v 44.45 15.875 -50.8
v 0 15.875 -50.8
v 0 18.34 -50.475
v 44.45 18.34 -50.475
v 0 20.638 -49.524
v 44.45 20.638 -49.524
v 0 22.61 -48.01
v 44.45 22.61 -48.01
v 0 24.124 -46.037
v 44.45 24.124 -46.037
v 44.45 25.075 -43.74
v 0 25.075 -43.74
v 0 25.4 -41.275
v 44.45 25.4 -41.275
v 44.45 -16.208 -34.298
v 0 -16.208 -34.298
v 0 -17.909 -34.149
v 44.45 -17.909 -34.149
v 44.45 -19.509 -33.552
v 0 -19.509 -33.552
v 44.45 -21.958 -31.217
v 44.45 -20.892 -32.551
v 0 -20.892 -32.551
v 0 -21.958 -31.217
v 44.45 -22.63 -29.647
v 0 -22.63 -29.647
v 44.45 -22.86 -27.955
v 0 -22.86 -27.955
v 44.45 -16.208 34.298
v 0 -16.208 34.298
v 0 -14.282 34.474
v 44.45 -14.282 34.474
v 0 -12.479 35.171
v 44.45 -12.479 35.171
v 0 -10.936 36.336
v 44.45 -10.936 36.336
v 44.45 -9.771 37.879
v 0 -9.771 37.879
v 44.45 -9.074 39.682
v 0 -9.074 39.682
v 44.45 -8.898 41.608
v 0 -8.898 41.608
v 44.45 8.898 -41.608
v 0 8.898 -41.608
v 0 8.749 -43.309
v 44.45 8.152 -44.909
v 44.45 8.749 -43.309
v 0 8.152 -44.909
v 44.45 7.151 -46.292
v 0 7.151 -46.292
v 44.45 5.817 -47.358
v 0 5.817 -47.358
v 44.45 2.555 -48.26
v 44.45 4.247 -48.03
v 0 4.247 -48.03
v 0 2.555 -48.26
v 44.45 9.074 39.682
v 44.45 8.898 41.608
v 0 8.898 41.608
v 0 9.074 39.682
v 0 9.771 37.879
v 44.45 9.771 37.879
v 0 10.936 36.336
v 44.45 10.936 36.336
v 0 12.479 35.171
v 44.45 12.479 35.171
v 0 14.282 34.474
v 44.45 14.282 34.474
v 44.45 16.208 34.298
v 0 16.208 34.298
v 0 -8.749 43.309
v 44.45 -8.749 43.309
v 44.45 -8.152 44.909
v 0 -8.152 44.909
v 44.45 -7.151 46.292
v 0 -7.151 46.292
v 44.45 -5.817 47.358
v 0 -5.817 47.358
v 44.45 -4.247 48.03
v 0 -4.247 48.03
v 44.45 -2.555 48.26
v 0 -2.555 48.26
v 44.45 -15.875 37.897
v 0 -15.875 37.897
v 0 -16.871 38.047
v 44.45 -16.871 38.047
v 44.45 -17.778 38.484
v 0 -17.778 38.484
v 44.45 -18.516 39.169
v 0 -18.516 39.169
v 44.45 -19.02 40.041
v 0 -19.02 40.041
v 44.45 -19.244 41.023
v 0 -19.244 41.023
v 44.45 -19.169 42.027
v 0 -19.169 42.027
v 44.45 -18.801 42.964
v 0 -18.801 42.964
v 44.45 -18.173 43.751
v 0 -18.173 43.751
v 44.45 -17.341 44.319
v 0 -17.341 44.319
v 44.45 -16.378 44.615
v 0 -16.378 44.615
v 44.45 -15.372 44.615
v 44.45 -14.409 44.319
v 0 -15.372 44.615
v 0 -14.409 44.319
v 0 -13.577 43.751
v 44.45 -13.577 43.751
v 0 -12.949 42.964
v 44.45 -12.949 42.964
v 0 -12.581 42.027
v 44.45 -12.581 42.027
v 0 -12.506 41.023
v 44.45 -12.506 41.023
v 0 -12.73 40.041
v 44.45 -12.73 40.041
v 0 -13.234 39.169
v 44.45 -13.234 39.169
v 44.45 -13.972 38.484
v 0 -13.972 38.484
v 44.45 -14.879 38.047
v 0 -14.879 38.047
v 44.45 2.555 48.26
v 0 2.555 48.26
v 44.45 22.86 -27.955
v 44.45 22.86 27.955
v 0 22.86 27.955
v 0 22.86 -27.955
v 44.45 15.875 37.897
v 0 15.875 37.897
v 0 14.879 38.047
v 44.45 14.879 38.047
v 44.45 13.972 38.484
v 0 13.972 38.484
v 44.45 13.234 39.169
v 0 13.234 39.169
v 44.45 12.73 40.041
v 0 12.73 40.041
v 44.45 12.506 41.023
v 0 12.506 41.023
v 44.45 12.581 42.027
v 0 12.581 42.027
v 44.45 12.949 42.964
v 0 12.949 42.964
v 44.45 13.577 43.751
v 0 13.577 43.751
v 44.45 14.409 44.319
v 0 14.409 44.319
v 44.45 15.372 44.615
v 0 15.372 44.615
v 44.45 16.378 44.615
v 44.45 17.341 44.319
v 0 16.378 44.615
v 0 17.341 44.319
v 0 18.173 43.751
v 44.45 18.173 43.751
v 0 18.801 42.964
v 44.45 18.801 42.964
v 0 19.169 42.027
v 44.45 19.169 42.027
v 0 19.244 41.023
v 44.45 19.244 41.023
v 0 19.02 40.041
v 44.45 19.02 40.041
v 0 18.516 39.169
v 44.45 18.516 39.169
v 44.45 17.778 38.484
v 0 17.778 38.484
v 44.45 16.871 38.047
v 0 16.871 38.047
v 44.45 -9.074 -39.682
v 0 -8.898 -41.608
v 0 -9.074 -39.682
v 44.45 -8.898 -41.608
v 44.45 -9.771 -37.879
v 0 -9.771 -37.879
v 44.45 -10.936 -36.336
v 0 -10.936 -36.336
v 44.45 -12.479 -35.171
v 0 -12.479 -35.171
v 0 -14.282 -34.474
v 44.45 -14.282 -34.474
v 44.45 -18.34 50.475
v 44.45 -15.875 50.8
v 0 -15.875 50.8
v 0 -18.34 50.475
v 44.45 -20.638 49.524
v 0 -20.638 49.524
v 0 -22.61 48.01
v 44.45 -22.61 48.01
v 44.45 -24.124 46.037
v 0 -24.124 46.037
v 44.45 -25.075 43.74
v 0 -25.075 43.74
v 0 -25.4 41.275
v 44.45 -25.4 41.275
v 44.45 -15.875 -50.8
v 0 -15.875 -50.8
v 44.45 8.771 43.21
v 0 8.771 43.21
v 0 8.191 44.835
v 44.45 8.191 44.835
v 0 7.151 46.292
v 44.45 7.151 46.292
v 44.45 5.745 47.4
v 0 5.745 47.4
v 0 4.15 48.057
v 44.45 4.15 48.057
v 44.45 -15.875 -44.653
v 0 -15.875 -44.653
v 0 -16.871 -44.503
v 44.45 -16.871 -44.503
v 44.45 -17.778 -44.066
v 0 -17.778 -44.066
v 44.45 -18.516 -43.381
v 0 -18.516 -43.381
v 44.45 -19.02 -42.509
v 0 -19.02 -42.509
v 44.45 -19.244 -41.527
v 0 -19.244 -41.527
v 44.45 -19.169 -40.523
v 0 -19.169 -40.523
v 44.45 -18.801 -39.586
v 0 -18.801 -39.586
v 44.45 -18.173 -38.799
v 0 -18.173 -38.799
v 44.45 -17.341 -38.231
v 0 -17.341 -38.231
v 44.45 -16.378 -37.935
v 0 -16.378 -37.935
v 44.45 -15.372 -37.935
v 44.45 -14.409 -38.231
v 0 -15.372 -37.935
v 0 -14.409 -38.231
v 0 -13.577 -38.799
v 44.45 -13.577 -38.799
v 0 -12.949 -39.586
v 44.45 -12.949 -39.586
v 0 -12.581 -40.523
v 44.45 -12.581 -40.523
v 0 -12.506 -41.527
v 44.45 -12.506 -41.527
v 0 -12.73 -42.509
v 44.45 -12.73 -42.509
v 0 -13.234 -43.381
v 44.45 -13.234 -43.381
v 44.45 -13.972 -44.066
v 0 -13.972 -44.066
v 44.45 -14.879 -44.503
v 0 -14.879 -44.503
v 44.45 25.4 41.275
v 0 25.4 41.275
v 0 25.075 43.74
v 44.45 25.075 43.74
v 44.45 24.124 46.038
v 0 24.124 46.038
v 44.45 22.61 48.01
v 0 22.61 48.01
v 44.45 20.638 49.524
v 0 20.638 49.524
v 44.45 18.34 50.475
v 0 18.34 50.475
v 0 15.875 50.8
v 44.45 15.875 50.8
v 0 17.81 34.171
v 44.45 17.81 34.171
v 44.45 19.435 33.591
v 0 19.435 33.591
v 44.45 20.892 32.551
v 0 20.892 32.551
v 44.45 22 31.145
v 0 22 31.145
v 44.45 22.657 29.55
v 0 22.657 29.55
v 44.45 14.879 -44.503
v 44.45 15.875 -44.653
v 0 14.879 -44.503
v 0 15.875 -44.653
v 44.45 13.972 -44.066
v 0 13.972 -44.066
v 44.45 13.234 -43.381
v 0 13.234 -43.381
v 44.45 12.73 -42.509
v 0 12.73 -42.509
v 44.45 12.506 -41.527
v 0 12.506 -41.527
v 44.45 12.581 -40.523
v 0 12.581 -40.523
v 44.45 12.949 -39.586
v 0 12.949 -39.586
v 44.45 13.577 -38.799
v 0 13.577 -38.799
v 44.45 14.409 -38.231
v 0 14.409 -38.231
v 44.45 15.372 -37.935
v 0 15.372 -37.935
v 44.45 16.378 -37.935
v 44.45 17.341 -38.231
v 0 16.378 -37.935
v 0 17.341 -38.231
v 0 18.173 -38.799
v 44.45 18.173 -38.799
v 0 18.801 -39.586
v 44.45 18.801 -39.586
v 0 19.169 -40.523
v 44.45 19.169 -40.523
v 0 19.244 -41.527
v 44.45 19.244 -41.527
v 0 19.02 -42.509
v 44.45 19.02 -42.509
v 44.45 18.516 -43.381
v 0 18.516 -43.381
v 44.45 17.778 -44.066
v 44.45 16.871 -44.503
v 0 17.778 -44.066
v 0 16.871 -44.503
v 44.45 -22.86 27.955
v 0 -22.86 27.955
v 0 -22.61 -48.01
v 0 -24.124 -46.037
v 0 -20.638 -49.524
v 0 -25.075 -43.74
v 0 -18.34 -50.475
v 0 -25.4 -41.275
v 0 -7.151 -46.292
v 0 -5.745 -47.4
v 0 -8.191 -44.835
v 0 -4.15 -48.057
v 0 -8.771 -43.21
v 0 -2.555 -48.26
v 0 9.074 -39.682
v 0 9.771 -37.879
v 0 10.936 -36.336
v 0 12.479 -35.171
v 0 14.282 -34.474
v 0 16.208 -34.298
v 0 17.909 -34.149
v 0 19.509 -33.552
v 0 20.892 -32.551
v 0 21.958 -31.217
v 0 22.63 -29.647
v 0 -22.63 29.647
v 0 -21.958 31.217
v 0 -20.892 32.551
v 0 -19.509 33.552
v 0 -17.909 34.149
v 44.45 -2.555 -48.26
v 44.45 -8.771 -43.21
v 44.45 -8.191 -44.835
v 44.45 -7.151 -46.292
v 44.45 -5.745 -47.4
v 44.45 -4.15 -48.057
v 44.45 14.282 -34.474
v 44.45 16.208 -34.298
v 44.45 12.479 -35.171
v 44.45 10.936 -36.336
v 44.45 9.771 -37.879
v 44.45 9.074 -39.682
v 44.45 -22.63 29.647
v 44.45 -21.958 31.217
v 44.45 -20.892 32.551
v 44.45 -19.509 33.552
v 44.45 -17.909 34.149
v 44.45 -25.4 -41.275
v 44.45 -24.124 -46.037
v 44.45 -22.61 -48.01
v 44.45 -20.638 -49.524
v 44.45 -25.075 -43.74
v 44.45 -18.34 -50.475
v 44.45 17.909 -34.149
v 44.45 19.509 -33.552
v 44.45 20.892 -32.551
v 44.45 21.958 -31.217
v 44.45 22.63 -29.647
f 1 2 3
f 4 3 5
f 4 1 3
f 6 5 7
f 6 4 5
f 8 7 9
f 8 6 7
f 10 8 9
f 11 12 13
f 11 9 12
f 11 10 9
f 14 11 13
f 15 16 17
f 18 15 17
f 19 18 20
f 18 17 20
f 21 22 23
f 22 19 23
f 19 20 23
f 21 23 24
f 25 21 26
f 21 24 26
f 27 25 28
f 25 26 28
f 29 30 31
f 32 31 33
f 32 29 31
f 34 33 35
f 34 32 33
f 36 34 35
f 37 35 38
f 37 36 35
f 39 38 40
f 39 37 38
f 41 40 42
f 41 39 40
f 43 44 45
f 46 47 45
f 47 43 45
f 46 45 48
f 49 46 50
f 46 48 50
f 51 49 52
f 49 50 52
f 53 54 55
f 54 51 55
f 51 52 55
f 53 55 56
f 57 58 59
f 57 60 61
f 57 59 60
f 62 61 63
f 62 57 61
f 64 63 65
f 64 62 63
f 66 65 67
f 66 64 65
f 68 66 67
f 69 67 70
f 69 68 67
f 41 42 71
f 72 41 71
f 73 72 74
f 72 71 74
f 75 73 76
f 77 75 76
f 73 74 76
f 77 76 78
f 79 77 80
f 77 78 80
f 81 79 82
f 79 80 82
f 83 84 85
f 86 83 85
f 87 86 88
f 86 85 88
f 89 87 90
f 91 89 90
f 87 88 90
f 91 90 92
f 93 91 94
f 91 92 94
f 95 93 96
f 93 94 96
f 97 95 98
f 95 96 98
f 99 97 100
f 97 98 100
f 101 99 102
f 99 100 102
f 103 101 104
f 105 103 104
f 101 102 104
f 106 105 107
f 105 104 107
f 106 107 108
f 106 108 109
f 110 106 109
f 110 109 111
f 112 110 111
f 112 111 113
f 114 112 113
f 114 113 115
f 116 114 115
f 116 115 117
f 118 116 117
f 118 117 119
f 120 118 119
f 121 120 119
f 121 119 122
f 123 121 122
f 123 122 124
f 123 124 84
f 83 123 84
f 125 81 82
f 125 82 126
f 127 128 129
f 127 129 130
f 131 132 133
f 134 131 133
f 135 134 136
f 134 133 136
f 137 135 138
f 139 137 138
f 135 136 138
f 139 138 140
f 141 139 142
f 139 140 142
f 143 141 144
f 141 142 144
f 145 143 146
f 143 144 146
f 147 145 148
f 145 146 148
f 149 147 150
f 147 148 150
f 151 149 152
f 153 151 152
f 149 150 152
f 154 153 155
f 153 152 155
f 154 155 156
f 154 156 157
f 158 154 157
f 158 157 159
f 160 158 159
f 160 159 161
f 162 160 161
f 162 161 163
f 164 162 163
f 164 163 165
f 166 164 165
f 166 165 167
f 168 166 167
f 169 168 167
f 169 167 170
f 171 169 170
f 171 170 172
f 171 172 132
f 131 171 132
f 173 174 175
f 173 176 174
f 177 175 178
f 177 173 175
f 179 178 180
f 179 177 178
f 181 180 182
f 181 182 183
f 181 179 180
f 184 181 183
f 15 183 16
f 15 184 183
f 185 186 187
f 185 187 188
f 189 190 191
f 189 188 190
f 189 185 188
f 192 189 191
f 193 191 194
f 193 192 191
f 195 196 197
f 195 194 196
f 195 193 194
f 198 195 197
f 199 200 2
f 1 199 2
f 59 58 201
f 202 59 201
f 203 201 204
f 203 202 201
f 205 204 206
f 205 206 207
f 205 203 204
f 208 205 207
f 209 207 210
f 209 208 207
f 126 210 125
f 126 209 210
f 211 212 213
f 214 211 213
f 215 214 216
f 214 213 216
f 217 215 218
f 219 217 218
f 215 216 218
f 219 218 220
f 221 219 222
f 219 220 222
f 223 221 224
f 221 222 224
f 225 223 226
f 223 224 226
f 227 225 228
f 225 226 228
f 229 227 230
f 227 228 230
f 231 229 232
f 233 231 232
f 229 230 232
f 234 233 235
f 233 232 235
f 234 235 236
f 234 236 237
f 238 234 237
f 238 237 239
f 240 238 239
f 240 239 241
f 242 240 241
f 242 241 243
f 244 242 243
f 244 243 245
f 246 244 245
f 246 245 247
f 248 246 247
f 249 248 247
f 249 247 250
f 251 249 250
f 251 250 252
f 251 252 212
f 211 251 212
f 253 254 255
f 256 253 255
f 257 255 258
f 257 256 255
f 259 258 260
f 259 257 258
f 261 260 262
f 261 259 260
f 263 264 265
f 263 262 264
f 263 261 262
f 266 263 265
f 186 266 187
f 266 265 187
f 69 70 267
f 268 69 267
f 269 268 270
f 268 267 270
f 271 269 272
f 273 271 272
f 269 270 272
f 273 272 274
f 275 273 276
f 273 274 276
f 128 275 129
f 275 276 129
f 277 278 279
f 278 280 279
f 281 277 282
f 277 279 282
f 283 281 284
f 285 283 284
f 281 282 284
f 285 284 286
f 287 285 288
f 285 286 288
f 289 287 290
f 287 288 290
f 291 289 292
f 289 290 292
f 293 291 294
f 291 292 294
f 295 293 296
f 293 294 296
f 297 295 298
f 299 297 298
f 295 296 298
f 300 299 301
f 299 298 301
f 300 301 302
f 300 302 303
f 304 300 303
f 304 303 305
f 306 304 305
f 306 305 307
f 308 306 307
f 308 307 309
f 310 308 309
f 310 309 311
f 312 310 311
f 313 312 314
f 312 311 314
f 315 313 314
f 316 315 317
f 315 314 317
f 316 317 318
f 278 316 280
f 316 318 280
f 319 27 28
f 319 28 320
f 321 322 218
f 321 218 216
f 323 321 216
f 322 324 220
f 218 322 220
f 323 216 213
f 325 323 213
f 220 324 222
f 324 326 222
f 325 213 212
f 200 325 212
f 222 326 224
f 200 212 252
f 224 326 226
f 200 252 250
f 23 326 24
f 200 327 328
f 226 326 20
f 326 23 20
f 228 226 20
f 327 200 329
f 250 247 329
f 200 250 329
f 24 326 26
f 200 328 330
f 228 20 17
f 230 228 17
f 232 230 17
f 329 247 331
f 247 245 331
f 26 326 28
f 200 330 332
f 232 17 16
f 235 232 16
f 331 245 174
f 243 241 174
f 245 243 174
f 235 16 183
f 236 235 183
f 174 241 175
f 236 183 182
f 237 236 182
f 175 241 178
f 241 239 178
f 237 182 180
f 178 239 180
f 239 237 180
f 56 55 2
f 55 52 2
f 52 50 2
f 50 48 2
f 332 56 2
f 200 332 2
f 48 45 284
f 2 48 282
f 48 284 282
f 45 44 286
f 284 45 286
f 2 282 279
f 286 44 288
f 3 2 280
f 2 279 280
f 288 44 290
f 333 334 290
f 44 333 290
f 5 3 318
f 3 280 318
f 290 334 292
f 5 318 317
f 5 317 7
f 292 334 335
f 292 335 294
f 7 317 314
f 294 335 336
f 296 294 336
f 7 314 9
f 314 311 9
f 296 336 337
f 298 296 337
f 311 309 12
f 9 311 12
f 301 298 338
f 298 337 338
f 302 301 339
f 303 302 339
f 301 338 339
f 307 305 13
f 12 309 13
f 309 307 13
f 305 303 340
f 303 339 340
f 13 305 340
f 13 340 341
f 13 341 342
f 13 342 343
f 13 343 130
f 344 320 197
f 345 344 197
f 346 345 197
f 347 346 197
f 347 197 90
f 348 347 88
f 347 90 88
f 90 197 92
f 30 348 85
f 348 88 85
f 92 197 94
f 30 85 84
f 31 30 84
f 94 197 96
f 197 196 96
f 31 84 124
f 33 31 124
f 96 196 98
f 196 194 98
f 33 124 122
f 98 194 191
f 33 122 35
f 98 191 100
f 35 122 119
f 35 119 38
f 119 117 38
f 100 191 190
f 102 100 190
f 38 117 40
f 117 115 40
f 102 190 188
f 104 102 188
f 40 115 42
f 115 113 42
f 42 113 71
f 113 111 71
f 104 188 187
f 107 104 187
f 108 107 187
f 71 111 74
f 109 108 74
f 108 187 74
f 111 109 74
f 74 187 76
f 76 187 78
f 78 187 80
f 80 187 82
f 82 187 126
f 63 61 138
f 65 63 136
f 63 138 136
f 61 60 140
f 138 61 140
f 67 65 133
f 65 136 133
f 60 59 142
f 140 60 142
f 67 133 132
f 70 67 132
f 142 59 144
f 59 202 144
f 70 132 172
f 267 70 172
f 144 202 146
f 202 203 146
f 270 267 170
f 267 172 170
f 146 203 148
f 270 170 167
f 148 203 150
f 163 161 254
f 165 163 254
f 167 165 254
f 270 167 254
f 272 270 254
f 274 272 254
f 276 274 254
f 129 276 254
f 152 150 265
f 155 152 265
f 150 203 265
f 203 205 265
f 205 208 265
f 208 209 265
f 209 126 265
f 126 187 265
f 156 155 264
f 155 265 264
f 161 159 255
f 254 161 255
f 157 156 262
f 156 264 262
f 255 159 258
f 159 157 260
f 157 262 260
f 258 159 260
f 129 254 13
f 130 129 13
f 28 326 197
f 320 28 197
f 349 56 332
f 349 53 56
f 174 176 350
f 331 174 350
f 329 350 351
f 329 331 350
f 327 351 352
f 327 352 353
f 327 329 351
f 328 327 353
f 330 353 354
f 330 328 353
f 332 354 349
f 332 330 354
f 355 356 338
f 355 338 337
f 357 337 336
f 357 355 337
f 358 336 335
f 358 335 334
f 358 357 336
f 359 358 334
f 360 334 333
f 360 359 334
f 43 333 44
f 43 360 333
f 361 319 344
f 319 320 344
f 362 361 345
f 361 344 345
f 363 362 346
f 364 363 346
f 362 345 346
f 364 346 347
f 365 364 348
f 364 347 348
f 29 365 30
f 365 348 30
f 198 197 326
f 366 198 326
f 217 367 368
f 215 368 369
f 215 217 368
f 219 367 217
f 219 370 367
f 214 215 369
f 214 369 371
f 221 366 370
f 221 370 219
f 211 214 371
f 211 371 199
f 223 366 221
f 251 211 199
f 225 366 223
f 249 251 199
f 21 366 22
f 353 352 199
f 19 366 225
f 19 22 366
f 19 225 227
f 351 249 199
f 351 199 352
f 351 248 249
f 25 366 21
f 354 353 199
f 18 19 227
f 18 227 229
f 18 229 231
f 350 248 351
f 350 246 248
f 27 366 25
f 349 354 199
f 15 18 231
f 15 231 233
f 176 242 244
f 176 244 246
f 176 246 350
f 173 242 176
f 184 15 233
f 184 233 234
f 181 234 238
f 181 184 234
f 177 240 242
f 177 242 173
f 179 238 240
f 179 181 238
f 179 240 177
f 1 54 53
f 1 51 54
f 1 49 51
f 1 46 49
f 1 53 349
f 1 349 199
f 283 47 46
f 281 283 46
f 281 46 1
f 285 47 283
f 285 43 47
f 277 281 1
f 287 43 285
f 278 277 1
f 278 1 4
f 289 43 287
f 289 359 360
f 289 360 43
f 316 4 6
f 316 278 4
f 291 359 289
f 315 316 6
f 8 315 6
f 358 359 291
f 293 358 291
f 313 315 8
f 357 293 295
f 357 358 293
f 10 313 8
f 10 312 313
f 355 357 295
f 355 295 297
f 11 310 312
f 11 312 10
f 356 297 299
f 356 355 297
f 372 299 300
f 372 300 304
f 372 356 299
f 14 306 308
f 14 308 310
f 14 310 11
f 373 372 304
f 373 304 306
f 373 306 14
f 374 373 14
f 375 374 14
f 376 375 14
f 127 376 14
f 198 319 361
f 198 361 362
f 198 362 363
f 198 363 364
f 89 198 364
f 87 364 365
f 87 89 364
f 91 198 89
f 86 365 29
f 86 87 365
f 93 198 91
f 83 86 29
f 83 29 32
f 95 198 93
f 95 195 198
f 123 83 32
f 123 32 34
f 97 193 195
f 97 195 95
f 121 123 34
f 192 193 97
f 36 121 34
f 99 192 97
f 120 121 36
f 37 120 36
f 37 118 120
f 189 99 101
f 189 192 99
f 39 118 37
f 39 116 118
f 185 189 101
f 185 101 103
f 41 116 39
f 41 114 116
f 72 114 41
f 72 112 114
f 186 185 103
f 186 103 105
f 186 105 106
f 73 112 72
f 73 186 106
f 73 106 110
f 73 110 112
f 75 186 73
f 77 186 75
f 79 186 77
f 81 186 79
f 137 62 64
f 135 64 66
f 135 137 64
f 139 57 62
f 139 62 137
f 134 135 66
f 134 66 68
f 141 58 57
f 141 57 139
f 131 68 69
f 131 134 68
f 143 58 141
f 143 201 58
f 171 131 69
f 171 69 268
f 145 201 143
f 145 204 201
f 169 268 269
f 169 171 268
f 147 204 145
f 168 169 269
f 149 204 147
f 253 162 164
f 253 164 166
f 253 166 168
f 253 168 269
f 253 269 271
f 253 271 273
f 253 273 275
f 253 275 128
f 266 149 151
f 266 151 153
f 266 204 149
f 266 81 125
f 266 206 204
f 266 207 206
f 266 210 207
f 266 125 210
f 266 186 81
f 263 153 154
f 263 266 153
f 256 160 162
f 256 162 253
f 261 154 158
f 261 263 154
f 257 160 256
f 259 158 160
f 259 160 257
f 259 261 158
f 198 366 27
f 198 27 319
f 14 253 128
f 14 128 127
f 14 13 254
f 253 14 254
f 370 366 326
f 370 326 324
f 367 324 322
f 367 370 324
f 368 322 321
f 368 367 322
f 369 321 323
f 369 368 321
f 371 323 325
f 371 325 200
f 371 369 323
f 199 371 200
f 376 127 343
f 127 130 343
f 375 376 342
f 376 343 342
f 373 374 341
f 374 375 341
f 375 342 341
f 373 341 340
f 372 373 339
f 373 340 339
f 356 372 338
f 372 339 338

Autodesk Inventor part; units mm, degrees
ref_plane "YZ Plane" through (0, 0, 0) normal (1, 0, 0) x (0, 1, 0)
ref_plane "XZ Plane" through (0, 0, 0) normal (0, 1, 0) x (-1, 0, 0)
ref_plane "XY Plane" through (0, 0, 0) normal (0, 0, 1) x (1, 0, 0)
sketch "Sketch1" plane through (0, 0, 0) normal (1, 0, 0) x (0, 1, 0)
  line L0 (-25.4, -50.8) -> (25.4, -50.8)
  line L1 (25.4, -50.8) -> (25.4, 50.8)
  line L2 (25.4, 50.8) -> (-25.4, 50.8)
  line L3 (-25.4, 50.8) -> (-25.4, -50.8)
  line L4 (-25.4, -50.8) -> (25.4, 50.8) construction
  line L5 (25.4, -50.8) -> (-25.4, 50.8) construction
  point P0 (0, 0)
  dimension "d0" = 50.8
  dimension "d1" = 101.6
extrude "Extrusion1" add sketch "Sketch1" along normal blind 44.45
fillet "Fillet2" radius 9.525 4 edges at (22.225, 25.4, 50.8) (22.225, -25.4, 50.8) (22.225, -25.4, -50.8) (22.225, 25.4, -50.8)
sketch "Sketch5" plane through (44.45, 0, 0) normal (1, 0, 0) x (0, 0, -1)
  arc A0 (50.8, 15.875) -> (41.275, 25.4) centre (41.275, 15.875) ccw projected
  line L0 (41.275, 25.4) -> (-41.275, 25.4) projected
  arc A1 (-41.275, 25.4) -> (-50.8, 15.875) centre (-41.275, 15.875) ccw projected
  line L1 (-50.8, 15.875) -> (-50.8, -15.875) projected
  arc A2 (-50.8, -15.875) -> (-41.275, -25.4) centre (-41.275, -15.875) ccw projected
  line L2 (-41.275, -25.4) -> (41.275, -25.4) projected
  arc A3 (41.275, -25.4) -> (50.8, -15.875) centre (41.275, -15.875) ccw projected
  line L3 (50.8, -15.875) -> (50.8, 15.875) projected
  point P0 (0, 0)
hole "Hole2" at (44.45, -15.875, -41.275) at (44.45, -15.875, 41.275) at (44.45, 15.875, 41.275) at (44.45, 15.875, -41.275) direction (-1, 0, 0) diameter 6.7564 end through all clearance for "Flat Head Machine Screw (82)" size "1/4" standard "Ansi Unified Screw Threads"
sketch "Sketch6" plane through (44.45, 0, 0) normal (1, 0, 0) x (0, 0, -1)
  circle A0 centre (41.275, -15.875) radius 3.3782 projected
  circle A1 centre (41.275, -15.875) radius 6.985
  circle A2 centre (41.275, 15.875) radius 3.3782 projected
  circle A3 centre (41.275, 15.875) radius 6.985
  circle A4 centre (-41.275, 15.875) radius 3.3782 projected
  circle A5 centre (-41.275, 15.875) radius 6.985
  circle A6 centre (-41.275, -15.875) radius 3.3782 projected
  circle A7 centre (-41.275, -15.875) radius 6.985
  line L0 (-48.26, 22.86) -> (48.26, 22.86)
  line L1 (48.26, 22.86) -> (48.26, -22.86)
  line L2 (48.26, -22.86) -> (-48.26, -22.86)
  line L3 (-48.26, -22.86) -> (-48.26, 22.86)
  line L4 (-48.26, 22.86) -> (48.26, -22.86) construction
  line L5 (48.26, 22.86) -> (-48.26, -22.86) construction
  arc A8 (41.275, -25.4) -> (50.8, -15.875) centre (41.275, -15.875) ccw projected
  arc A9 (50.8, 15.875) -> (41.275, 25.4) centre (41.275, 15.875) ccw projected
  arc A10 (-41.275, 25.4) -> (-50.8, 15.875) centre (-41.275, 15.875) ccw projected
  arc A11 (-50.8, -15.875) -> (-41.275, -25.4) centre (-41.275, -15.875) ccw projected
  line L6 (50.8, -15.875) -> (50.8, 15.875) projected
  line L7 (41.275, 25.4) -> (-41.275, 25.4) projected
  point P0 (0, 0)
  point P1 (-48.26, 15.875)
  point P2 (-48.26, -15.875)
  point P3 (-41.275, -22.86)
  point P4 (41.275, -22.86)
  point P5 (48.26, -15.875)
  point P6 (48.26, 15.875)
  point P7 (41.275, 22.86)
  point P8 (-41.275, 22.86)
  dimension "d24" = 2.54
  dimension "d27" = 2.54
extrude "Extrusion2" cut sketch "Sketch6" against normal through all contours A1 L2 A7 L3 A5 L0 A3 L1
fillet "Fillet3" radius 6.35 8 edges at (22.225, 15.875, 48.26) (22.225, 22.86, 41.275) (22.225, -22.86, -41.275) (22.225, -15.875, -48.26) (22.225, 15.875, -48.26) (22.225, 22.86, -41.275) (22.225, -22.86, 41.275) (22.225, -15.875, 48.26)
equation "\"d2\" = Base"
equation "\"Base\" = 44.45"
properties part number "NASA-20-MM-MB-01" material "Aluminum 6061"
